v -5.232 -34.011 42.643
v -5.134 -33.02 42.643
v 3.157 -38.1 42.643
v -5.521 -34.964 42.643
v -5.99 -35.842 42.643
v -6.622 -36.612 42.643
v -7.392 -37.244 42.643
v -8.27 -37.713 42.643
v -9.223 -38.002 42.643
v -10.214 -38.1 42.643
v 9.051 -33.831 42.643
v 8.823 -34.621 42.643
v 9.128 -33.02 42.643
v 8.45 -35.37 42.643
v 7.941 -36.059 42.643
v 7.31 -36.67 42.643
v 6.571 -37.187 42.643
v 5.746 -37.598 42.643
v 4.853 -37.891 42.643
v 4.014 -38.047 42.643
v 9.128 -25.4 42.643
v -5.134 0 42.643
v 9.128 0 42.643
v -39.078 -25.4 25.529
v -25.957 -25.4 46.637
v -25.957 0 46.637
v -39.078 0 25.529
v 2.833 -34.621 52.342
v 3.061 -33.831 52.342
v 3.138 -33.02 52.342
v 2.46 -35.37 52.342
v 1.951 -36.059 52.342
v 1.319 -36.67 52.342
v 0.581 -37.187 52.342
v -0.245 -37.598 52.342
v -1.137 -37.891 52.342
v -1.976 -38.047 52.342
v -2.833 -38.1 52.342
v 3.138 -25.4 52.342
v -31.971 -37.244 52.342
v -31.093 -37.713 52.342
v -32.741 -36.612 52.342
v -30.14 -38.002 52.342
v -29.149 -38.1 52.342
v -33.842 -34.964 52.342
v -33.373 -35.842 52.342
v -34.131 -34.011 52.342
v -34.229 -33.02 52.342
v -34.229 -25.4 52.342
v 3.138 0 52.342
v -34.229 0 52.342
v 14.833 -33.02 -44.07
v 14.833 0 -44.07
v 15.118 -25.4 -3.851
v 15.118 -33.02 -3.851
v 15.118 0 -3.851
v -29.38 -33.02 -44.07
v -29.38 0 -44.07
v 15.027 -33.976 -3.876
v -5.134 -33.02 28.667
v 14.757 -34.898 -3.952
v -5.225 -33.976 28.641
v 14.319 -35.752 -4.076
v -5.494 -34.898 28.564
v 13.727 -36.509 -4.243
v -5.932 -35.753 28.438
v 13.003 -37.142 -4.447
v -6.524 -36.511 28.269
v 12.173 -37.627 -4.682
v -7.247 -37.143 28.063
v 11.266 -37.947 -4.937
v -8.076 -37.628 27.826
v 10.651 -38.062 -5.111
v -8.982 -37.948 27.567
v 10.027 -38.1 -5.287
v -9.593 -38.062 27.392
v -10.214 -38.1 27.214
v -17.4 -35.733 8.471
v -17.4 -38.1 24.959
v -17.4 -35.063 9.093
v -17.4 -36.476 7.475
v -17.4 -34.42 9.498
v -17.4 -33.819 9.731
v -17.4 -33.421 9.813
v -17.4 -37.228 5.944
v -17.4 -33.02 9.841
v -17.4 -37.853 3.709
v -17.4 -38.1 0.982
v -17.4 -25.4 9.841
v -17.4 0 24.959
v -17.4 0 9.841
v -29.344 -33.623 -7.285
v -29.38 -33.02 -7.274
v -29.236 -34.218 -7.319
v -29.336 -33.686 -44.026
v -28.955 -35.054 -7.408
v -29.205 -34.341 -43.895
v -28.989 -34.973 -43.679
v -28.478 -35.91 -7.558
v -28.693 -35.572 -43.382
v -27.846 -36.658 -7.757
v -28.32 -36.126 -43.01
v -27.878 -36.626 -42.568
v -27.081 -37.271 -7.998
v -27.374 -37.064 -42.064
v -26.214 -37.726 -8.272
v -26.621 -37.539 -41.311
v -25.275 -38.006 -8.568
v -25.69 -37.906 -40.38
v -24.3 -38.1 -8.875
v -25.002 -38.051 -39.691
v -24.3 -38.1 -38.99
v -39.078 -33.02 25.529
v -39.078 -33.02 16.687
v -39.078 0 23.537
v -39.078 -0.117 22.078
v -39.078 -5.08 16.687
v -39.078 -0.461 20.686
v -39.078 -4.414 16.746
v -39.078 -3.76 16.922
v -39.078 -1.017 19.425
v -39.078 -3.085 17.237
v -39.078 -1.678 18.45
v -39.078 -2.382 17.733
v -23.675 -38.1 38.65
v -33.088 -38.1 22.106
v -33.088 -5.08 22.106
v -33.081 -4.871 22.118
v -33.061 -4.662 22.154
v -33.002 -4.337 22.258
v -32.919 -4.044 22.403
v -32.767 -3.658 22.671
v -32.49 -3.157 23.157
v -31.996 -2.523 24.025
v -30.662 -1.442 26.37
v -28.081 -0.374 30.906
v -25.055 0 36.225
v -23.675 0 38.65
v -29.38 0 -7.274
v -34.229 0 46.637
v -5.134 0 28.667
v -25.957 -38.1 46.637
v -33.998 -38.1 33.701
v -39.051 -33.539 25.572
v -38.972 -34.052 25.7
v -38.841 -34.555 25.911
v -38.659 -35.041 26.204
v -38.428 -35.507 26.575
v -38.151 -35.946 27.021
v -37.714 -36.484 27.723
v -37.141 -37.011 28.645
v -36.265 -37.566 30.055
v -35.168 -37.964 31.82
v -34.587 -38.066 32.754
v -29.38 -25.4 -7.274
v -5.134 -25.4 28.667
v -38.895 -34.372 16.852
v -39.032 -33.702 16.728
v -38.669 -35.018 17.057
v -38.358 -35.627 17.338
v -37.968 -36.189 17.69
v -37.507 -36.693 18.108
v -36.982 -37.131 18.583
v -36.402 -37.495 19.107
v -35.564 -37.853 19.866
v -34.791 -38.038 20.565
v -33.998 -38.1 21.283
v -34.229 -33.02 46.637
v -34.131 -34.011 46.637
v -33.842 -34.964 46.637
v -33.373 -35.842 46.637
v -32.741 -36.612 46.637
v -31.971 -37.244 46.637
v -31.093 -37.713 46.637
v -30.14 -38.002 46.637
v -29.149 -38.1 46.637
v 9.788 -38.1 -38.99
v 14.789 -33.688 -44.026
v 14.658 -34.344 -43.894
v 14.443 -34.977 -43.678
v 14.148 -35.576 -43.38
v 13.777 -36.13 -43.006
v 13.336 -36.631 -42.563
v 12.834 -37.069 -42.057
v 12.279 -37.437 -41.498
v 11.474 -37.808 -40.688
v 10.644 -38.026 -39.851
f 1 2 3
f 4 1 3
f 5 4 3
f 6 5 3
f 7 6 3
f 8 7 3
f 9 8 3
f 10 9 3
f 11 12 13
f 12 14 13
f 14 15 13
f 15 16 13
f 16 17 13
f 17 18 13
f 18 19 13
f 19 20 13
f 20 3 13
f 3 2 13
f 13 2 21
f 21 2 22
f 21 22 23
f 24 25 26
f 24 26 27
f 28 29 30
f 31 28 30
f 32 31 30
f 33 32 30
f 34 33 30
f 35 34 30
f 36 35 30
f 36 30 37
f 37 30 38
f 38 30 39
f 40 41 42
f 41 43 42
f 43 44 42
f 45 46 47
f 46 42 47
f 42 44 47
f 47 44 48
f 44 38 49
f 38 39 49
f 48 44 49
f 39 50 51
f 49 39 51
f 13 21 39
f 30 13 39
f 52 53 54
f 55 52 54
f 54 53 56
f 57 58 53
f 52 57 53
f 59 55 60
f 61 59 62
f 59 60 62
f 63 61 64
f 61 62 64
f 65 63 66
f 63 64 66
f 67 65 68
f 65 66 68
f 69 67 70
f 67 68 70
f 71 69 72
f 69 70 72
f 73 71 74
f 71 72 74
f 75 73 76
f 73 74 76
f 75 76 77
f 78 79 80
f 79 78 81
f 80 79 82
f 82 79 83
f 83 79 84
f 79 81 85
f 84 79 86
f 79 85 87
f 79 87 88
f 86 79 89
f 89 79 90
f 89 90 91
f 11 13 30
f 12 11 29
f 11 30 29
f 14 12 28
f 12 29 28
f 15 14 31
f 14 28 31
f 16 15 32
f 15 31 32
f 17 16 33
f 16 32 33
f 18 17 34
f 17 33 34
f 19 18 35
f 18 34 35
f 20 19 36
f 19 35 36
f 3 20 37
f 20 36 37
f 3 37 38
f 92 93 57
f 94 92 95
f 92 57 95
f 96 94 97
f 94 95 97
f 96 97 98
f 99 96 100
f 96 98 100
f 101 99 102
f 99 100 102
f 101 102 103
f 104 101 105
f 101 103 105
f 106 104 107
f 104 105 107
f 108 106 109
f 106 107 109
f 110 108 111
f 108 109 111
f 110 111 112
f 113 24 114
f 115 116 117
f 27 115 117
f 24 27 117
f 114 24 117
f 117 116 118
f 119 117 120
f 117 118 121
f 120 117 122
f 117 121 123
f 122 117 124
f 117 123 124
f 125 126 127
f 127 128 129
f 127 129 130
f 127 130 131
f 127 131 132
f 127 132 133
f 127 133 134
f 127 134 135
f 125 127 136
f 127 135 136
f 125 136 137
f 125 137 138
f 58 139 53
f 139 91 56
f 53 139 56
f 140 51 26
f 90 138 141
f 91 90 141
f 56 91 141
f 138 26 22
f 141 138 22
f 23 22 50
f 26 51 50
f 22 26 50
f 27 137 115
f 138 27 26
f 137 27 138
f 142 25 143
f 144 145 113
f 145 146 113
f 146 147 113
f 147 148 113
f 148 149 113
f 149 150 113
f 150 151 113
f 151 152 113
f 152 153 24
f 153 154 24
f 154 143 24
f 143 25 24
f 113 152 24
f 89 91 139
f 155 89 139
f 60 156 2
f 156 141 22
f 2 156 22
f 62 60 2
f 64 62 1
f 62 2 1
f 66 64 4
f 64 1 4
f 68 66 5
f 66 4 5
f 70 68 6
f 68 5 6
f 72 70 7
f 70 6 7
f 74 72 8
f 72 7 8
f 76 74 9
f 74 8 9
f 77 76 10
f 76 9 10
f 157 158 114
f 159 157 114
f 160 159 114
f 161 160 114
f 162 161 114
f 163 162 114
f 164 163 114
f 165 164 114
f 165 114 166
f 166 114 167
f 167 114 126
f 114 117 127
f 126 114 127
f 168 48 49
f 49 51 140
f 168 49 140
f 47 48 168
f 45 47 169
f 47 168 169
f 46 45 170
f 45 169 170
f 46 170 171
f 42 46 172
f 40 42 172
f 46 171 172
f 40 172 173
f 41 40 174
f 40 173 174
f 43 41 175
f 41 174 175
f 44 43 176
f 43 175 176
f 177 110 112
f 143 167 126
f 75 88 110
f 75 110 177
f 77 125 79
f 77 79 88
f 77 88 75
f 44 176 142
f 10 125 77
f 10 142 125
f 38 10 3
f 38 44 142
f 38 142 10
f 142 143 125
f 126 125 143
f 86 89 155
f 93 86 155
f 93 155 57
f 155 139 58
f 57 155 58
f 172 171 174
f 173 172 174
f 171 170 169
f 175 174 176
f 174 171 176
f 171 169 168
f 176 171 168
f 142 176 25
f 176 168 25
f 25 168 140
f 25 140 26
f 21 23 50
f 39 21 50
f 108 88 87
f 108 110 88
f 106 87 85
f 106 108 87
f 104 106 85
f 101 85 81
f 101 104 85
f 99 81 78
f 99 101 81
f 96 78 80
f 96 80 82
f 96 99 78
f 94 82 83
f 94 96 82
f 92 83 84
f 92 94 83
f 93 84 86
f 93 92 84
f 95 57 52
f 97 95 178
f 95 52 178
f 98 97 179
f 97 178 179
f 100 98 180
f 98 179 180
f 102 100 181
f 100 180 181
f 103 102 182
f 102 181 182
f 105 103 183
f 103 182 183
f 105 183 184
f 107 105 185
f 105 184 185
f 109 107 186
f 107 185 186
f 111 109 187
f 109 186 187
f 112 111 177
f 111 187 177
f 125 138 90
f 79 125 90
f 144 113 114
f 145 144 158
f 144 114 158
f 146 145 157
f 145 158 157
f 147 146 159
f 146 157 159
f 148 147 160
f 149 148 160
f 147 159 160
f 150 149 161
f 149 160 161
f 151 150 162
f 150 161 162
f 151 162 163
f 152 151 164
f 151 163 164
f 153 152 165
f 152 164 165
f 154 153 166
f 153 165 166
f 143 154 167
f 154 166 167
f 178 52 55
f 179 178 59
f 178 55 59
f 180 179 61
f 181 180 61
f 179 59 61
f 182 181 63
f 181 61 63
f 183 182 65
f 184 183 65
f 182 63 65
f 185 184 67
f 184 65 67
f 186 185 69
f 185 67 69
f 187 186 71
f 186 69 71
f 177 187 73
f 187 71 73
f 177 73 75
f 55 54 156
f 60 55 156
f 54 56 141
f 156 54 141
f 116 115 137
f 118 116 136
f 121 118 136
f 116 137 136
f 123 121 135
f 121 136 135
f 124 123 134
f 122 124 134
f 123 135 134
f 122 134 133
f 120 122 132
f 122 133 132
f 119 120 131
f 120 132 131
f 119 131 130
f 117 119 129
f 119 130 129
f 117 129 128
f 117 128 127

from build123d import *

# Parameters (mm, degrees)
F1_DEPTH = 12.7
F2_DEPTH = 25.4
F3_R     = 5.08


with BuildPart() as f1:
    # F0 (on Front) → F1 (new body)
    with BuildSketch(Plane.XZ):
        Polygon((-29.3797869235, -7.2736367583), (-29.3797869235, -44.0696775913), (14.8325152695, -44.0696775913), (15.1177551597, -3.8507485297), (-5.1343315281, 28.666684404), (-5.1343315281, 42.6434762776), (9.1277007014, 42.6434762776), (3.1376483385, 52.341658622), (-34.2288762331, 52.341658622), (-34.2288762331, 46.6368459165), (-25.9568989277, 46.6368459165), (-39.0779674053, 25.529038161), (-39.0779674053, 16.6865773499), (-33.0879166722, 22.1061483026), (-23.674974218, 38.6501066387), (-17.3996798694, 24.958556518), (-17.3996798694, 9.8408022895), align=None)
    extrude(amount=F1_DEPTH)

    # F0 (on Front) + F1_face (on face) + F1_face1 (on face) → F2 (join)
    with BuildSketch(Plane.XZ):
        Polygon((-29.3797869235, -7.2736367583), (-29.3797869235, -44.0696775913), (14.8325152695, -44.0696775913), (15.1177551597, -3.8507485297), (-5.1343315281, 28.666684404), (-5.1343315281, 42.6434762776), (9.1277007014, 42.6434762776), (3.1376483385, 52.341658622), (-34.2288762331, 52.341658622), (-34.2288762331, 46.6368459165), (-25.9568989277, 46.6368459165), (-39.0779674053, 25.529038161), (-39.0779674053, 16.6865773499), (-33.0879166722, 22.1061483026), (-23.674974218, 38.6501066387), (-17.3996798694, 24.958556518), (-17.3996798694, 9.8408022895), align=None)
    with BuildSketch(Plane(origin=(-9.327897656, -12.7, -1.3317405801), x_dir=(1, 0, 0), z_dir=(0, -1, 0))):
        Polygon((18.4555983573, 43.9752168577), (12.4655459944, 53.6733992022), (-24.9009785771, 53.6733992022), (-24.9009785771, 47.9685864966), (-16.6290012717, 47.9685864966), (-29.7500697493, 26.8607787412), (-29.7500697493, 18.01831793), (-23.7600190162, 23.4378888827), (-14.347076562, 39.9818472188), (-8.0717822134, 26.2902970981), (-8.0717822134, 11.1725428697), (-20.0518892675, -5.9418961782), (-20.0518892675, -42.7379370112), (24.1604129255, -42.7379370112), (24.4456528157, -2.5190079495), (4.1935661279, 29.9984249842), (4.1935661279, 43.9752168577), align=None)
    with BuildSketch(Plane(origin=(-9.327897656, 0, -1.3317405801), x_dir=(1, 0, 0), z_dir=(0, 1, 0))):
        Polygon((12.4655459944, -53.6733992022), (18.4555983573, -43.9752168577), (4.1935661279, -43.9752168577), (4.1935661279, -29.9984249842), (24.4456528157, 2.5190079495), (24.1604129255, 42.7379370112), (-20.0518892675, 42.7379370112), (-20.0518892675, 5.9418961782), (-8.0717822134, -11.1725428697), (-8.0717822134, -26.2902970981), (-14.347076562, -39.9818472188), (-23.7600190162, -23.4378888827), (-29.7500697493, -18.01831793), (-29.7500697493, -26.8607787412), (-16.6290012717, -47.9685864966), (-24.9009785771, -47.9685864966), (-24.9009785771, -53.6733992022), align=None)
    extrude(amount=F2_DEPTH, dir=(0, -1, 0))

    # F3
    f3_edges = [f1.edges().sort_by_distance(p)[0] for p in [
        (-39.077967, -38.1, 21.107808),
        (-36.082942, 0, 19.396363),
        (6.132675, -38.1, 47.492567),
        (4.991712, -38.1, 12.407968),
        (-5.134332, -38.1, 35.65508),
        (14.975135, -38.1, -23.960213),
        (-34.228876, -38.1, 49.489252),
        (-23.389733, -38.1, 1.283583),
        (-29.379787, -38.1, -25.671657),
        (-7.273636, -38.1, -44.069678),
    ]]
    fillet(f3_edges, radius=F3_R)


solid = f1.part
